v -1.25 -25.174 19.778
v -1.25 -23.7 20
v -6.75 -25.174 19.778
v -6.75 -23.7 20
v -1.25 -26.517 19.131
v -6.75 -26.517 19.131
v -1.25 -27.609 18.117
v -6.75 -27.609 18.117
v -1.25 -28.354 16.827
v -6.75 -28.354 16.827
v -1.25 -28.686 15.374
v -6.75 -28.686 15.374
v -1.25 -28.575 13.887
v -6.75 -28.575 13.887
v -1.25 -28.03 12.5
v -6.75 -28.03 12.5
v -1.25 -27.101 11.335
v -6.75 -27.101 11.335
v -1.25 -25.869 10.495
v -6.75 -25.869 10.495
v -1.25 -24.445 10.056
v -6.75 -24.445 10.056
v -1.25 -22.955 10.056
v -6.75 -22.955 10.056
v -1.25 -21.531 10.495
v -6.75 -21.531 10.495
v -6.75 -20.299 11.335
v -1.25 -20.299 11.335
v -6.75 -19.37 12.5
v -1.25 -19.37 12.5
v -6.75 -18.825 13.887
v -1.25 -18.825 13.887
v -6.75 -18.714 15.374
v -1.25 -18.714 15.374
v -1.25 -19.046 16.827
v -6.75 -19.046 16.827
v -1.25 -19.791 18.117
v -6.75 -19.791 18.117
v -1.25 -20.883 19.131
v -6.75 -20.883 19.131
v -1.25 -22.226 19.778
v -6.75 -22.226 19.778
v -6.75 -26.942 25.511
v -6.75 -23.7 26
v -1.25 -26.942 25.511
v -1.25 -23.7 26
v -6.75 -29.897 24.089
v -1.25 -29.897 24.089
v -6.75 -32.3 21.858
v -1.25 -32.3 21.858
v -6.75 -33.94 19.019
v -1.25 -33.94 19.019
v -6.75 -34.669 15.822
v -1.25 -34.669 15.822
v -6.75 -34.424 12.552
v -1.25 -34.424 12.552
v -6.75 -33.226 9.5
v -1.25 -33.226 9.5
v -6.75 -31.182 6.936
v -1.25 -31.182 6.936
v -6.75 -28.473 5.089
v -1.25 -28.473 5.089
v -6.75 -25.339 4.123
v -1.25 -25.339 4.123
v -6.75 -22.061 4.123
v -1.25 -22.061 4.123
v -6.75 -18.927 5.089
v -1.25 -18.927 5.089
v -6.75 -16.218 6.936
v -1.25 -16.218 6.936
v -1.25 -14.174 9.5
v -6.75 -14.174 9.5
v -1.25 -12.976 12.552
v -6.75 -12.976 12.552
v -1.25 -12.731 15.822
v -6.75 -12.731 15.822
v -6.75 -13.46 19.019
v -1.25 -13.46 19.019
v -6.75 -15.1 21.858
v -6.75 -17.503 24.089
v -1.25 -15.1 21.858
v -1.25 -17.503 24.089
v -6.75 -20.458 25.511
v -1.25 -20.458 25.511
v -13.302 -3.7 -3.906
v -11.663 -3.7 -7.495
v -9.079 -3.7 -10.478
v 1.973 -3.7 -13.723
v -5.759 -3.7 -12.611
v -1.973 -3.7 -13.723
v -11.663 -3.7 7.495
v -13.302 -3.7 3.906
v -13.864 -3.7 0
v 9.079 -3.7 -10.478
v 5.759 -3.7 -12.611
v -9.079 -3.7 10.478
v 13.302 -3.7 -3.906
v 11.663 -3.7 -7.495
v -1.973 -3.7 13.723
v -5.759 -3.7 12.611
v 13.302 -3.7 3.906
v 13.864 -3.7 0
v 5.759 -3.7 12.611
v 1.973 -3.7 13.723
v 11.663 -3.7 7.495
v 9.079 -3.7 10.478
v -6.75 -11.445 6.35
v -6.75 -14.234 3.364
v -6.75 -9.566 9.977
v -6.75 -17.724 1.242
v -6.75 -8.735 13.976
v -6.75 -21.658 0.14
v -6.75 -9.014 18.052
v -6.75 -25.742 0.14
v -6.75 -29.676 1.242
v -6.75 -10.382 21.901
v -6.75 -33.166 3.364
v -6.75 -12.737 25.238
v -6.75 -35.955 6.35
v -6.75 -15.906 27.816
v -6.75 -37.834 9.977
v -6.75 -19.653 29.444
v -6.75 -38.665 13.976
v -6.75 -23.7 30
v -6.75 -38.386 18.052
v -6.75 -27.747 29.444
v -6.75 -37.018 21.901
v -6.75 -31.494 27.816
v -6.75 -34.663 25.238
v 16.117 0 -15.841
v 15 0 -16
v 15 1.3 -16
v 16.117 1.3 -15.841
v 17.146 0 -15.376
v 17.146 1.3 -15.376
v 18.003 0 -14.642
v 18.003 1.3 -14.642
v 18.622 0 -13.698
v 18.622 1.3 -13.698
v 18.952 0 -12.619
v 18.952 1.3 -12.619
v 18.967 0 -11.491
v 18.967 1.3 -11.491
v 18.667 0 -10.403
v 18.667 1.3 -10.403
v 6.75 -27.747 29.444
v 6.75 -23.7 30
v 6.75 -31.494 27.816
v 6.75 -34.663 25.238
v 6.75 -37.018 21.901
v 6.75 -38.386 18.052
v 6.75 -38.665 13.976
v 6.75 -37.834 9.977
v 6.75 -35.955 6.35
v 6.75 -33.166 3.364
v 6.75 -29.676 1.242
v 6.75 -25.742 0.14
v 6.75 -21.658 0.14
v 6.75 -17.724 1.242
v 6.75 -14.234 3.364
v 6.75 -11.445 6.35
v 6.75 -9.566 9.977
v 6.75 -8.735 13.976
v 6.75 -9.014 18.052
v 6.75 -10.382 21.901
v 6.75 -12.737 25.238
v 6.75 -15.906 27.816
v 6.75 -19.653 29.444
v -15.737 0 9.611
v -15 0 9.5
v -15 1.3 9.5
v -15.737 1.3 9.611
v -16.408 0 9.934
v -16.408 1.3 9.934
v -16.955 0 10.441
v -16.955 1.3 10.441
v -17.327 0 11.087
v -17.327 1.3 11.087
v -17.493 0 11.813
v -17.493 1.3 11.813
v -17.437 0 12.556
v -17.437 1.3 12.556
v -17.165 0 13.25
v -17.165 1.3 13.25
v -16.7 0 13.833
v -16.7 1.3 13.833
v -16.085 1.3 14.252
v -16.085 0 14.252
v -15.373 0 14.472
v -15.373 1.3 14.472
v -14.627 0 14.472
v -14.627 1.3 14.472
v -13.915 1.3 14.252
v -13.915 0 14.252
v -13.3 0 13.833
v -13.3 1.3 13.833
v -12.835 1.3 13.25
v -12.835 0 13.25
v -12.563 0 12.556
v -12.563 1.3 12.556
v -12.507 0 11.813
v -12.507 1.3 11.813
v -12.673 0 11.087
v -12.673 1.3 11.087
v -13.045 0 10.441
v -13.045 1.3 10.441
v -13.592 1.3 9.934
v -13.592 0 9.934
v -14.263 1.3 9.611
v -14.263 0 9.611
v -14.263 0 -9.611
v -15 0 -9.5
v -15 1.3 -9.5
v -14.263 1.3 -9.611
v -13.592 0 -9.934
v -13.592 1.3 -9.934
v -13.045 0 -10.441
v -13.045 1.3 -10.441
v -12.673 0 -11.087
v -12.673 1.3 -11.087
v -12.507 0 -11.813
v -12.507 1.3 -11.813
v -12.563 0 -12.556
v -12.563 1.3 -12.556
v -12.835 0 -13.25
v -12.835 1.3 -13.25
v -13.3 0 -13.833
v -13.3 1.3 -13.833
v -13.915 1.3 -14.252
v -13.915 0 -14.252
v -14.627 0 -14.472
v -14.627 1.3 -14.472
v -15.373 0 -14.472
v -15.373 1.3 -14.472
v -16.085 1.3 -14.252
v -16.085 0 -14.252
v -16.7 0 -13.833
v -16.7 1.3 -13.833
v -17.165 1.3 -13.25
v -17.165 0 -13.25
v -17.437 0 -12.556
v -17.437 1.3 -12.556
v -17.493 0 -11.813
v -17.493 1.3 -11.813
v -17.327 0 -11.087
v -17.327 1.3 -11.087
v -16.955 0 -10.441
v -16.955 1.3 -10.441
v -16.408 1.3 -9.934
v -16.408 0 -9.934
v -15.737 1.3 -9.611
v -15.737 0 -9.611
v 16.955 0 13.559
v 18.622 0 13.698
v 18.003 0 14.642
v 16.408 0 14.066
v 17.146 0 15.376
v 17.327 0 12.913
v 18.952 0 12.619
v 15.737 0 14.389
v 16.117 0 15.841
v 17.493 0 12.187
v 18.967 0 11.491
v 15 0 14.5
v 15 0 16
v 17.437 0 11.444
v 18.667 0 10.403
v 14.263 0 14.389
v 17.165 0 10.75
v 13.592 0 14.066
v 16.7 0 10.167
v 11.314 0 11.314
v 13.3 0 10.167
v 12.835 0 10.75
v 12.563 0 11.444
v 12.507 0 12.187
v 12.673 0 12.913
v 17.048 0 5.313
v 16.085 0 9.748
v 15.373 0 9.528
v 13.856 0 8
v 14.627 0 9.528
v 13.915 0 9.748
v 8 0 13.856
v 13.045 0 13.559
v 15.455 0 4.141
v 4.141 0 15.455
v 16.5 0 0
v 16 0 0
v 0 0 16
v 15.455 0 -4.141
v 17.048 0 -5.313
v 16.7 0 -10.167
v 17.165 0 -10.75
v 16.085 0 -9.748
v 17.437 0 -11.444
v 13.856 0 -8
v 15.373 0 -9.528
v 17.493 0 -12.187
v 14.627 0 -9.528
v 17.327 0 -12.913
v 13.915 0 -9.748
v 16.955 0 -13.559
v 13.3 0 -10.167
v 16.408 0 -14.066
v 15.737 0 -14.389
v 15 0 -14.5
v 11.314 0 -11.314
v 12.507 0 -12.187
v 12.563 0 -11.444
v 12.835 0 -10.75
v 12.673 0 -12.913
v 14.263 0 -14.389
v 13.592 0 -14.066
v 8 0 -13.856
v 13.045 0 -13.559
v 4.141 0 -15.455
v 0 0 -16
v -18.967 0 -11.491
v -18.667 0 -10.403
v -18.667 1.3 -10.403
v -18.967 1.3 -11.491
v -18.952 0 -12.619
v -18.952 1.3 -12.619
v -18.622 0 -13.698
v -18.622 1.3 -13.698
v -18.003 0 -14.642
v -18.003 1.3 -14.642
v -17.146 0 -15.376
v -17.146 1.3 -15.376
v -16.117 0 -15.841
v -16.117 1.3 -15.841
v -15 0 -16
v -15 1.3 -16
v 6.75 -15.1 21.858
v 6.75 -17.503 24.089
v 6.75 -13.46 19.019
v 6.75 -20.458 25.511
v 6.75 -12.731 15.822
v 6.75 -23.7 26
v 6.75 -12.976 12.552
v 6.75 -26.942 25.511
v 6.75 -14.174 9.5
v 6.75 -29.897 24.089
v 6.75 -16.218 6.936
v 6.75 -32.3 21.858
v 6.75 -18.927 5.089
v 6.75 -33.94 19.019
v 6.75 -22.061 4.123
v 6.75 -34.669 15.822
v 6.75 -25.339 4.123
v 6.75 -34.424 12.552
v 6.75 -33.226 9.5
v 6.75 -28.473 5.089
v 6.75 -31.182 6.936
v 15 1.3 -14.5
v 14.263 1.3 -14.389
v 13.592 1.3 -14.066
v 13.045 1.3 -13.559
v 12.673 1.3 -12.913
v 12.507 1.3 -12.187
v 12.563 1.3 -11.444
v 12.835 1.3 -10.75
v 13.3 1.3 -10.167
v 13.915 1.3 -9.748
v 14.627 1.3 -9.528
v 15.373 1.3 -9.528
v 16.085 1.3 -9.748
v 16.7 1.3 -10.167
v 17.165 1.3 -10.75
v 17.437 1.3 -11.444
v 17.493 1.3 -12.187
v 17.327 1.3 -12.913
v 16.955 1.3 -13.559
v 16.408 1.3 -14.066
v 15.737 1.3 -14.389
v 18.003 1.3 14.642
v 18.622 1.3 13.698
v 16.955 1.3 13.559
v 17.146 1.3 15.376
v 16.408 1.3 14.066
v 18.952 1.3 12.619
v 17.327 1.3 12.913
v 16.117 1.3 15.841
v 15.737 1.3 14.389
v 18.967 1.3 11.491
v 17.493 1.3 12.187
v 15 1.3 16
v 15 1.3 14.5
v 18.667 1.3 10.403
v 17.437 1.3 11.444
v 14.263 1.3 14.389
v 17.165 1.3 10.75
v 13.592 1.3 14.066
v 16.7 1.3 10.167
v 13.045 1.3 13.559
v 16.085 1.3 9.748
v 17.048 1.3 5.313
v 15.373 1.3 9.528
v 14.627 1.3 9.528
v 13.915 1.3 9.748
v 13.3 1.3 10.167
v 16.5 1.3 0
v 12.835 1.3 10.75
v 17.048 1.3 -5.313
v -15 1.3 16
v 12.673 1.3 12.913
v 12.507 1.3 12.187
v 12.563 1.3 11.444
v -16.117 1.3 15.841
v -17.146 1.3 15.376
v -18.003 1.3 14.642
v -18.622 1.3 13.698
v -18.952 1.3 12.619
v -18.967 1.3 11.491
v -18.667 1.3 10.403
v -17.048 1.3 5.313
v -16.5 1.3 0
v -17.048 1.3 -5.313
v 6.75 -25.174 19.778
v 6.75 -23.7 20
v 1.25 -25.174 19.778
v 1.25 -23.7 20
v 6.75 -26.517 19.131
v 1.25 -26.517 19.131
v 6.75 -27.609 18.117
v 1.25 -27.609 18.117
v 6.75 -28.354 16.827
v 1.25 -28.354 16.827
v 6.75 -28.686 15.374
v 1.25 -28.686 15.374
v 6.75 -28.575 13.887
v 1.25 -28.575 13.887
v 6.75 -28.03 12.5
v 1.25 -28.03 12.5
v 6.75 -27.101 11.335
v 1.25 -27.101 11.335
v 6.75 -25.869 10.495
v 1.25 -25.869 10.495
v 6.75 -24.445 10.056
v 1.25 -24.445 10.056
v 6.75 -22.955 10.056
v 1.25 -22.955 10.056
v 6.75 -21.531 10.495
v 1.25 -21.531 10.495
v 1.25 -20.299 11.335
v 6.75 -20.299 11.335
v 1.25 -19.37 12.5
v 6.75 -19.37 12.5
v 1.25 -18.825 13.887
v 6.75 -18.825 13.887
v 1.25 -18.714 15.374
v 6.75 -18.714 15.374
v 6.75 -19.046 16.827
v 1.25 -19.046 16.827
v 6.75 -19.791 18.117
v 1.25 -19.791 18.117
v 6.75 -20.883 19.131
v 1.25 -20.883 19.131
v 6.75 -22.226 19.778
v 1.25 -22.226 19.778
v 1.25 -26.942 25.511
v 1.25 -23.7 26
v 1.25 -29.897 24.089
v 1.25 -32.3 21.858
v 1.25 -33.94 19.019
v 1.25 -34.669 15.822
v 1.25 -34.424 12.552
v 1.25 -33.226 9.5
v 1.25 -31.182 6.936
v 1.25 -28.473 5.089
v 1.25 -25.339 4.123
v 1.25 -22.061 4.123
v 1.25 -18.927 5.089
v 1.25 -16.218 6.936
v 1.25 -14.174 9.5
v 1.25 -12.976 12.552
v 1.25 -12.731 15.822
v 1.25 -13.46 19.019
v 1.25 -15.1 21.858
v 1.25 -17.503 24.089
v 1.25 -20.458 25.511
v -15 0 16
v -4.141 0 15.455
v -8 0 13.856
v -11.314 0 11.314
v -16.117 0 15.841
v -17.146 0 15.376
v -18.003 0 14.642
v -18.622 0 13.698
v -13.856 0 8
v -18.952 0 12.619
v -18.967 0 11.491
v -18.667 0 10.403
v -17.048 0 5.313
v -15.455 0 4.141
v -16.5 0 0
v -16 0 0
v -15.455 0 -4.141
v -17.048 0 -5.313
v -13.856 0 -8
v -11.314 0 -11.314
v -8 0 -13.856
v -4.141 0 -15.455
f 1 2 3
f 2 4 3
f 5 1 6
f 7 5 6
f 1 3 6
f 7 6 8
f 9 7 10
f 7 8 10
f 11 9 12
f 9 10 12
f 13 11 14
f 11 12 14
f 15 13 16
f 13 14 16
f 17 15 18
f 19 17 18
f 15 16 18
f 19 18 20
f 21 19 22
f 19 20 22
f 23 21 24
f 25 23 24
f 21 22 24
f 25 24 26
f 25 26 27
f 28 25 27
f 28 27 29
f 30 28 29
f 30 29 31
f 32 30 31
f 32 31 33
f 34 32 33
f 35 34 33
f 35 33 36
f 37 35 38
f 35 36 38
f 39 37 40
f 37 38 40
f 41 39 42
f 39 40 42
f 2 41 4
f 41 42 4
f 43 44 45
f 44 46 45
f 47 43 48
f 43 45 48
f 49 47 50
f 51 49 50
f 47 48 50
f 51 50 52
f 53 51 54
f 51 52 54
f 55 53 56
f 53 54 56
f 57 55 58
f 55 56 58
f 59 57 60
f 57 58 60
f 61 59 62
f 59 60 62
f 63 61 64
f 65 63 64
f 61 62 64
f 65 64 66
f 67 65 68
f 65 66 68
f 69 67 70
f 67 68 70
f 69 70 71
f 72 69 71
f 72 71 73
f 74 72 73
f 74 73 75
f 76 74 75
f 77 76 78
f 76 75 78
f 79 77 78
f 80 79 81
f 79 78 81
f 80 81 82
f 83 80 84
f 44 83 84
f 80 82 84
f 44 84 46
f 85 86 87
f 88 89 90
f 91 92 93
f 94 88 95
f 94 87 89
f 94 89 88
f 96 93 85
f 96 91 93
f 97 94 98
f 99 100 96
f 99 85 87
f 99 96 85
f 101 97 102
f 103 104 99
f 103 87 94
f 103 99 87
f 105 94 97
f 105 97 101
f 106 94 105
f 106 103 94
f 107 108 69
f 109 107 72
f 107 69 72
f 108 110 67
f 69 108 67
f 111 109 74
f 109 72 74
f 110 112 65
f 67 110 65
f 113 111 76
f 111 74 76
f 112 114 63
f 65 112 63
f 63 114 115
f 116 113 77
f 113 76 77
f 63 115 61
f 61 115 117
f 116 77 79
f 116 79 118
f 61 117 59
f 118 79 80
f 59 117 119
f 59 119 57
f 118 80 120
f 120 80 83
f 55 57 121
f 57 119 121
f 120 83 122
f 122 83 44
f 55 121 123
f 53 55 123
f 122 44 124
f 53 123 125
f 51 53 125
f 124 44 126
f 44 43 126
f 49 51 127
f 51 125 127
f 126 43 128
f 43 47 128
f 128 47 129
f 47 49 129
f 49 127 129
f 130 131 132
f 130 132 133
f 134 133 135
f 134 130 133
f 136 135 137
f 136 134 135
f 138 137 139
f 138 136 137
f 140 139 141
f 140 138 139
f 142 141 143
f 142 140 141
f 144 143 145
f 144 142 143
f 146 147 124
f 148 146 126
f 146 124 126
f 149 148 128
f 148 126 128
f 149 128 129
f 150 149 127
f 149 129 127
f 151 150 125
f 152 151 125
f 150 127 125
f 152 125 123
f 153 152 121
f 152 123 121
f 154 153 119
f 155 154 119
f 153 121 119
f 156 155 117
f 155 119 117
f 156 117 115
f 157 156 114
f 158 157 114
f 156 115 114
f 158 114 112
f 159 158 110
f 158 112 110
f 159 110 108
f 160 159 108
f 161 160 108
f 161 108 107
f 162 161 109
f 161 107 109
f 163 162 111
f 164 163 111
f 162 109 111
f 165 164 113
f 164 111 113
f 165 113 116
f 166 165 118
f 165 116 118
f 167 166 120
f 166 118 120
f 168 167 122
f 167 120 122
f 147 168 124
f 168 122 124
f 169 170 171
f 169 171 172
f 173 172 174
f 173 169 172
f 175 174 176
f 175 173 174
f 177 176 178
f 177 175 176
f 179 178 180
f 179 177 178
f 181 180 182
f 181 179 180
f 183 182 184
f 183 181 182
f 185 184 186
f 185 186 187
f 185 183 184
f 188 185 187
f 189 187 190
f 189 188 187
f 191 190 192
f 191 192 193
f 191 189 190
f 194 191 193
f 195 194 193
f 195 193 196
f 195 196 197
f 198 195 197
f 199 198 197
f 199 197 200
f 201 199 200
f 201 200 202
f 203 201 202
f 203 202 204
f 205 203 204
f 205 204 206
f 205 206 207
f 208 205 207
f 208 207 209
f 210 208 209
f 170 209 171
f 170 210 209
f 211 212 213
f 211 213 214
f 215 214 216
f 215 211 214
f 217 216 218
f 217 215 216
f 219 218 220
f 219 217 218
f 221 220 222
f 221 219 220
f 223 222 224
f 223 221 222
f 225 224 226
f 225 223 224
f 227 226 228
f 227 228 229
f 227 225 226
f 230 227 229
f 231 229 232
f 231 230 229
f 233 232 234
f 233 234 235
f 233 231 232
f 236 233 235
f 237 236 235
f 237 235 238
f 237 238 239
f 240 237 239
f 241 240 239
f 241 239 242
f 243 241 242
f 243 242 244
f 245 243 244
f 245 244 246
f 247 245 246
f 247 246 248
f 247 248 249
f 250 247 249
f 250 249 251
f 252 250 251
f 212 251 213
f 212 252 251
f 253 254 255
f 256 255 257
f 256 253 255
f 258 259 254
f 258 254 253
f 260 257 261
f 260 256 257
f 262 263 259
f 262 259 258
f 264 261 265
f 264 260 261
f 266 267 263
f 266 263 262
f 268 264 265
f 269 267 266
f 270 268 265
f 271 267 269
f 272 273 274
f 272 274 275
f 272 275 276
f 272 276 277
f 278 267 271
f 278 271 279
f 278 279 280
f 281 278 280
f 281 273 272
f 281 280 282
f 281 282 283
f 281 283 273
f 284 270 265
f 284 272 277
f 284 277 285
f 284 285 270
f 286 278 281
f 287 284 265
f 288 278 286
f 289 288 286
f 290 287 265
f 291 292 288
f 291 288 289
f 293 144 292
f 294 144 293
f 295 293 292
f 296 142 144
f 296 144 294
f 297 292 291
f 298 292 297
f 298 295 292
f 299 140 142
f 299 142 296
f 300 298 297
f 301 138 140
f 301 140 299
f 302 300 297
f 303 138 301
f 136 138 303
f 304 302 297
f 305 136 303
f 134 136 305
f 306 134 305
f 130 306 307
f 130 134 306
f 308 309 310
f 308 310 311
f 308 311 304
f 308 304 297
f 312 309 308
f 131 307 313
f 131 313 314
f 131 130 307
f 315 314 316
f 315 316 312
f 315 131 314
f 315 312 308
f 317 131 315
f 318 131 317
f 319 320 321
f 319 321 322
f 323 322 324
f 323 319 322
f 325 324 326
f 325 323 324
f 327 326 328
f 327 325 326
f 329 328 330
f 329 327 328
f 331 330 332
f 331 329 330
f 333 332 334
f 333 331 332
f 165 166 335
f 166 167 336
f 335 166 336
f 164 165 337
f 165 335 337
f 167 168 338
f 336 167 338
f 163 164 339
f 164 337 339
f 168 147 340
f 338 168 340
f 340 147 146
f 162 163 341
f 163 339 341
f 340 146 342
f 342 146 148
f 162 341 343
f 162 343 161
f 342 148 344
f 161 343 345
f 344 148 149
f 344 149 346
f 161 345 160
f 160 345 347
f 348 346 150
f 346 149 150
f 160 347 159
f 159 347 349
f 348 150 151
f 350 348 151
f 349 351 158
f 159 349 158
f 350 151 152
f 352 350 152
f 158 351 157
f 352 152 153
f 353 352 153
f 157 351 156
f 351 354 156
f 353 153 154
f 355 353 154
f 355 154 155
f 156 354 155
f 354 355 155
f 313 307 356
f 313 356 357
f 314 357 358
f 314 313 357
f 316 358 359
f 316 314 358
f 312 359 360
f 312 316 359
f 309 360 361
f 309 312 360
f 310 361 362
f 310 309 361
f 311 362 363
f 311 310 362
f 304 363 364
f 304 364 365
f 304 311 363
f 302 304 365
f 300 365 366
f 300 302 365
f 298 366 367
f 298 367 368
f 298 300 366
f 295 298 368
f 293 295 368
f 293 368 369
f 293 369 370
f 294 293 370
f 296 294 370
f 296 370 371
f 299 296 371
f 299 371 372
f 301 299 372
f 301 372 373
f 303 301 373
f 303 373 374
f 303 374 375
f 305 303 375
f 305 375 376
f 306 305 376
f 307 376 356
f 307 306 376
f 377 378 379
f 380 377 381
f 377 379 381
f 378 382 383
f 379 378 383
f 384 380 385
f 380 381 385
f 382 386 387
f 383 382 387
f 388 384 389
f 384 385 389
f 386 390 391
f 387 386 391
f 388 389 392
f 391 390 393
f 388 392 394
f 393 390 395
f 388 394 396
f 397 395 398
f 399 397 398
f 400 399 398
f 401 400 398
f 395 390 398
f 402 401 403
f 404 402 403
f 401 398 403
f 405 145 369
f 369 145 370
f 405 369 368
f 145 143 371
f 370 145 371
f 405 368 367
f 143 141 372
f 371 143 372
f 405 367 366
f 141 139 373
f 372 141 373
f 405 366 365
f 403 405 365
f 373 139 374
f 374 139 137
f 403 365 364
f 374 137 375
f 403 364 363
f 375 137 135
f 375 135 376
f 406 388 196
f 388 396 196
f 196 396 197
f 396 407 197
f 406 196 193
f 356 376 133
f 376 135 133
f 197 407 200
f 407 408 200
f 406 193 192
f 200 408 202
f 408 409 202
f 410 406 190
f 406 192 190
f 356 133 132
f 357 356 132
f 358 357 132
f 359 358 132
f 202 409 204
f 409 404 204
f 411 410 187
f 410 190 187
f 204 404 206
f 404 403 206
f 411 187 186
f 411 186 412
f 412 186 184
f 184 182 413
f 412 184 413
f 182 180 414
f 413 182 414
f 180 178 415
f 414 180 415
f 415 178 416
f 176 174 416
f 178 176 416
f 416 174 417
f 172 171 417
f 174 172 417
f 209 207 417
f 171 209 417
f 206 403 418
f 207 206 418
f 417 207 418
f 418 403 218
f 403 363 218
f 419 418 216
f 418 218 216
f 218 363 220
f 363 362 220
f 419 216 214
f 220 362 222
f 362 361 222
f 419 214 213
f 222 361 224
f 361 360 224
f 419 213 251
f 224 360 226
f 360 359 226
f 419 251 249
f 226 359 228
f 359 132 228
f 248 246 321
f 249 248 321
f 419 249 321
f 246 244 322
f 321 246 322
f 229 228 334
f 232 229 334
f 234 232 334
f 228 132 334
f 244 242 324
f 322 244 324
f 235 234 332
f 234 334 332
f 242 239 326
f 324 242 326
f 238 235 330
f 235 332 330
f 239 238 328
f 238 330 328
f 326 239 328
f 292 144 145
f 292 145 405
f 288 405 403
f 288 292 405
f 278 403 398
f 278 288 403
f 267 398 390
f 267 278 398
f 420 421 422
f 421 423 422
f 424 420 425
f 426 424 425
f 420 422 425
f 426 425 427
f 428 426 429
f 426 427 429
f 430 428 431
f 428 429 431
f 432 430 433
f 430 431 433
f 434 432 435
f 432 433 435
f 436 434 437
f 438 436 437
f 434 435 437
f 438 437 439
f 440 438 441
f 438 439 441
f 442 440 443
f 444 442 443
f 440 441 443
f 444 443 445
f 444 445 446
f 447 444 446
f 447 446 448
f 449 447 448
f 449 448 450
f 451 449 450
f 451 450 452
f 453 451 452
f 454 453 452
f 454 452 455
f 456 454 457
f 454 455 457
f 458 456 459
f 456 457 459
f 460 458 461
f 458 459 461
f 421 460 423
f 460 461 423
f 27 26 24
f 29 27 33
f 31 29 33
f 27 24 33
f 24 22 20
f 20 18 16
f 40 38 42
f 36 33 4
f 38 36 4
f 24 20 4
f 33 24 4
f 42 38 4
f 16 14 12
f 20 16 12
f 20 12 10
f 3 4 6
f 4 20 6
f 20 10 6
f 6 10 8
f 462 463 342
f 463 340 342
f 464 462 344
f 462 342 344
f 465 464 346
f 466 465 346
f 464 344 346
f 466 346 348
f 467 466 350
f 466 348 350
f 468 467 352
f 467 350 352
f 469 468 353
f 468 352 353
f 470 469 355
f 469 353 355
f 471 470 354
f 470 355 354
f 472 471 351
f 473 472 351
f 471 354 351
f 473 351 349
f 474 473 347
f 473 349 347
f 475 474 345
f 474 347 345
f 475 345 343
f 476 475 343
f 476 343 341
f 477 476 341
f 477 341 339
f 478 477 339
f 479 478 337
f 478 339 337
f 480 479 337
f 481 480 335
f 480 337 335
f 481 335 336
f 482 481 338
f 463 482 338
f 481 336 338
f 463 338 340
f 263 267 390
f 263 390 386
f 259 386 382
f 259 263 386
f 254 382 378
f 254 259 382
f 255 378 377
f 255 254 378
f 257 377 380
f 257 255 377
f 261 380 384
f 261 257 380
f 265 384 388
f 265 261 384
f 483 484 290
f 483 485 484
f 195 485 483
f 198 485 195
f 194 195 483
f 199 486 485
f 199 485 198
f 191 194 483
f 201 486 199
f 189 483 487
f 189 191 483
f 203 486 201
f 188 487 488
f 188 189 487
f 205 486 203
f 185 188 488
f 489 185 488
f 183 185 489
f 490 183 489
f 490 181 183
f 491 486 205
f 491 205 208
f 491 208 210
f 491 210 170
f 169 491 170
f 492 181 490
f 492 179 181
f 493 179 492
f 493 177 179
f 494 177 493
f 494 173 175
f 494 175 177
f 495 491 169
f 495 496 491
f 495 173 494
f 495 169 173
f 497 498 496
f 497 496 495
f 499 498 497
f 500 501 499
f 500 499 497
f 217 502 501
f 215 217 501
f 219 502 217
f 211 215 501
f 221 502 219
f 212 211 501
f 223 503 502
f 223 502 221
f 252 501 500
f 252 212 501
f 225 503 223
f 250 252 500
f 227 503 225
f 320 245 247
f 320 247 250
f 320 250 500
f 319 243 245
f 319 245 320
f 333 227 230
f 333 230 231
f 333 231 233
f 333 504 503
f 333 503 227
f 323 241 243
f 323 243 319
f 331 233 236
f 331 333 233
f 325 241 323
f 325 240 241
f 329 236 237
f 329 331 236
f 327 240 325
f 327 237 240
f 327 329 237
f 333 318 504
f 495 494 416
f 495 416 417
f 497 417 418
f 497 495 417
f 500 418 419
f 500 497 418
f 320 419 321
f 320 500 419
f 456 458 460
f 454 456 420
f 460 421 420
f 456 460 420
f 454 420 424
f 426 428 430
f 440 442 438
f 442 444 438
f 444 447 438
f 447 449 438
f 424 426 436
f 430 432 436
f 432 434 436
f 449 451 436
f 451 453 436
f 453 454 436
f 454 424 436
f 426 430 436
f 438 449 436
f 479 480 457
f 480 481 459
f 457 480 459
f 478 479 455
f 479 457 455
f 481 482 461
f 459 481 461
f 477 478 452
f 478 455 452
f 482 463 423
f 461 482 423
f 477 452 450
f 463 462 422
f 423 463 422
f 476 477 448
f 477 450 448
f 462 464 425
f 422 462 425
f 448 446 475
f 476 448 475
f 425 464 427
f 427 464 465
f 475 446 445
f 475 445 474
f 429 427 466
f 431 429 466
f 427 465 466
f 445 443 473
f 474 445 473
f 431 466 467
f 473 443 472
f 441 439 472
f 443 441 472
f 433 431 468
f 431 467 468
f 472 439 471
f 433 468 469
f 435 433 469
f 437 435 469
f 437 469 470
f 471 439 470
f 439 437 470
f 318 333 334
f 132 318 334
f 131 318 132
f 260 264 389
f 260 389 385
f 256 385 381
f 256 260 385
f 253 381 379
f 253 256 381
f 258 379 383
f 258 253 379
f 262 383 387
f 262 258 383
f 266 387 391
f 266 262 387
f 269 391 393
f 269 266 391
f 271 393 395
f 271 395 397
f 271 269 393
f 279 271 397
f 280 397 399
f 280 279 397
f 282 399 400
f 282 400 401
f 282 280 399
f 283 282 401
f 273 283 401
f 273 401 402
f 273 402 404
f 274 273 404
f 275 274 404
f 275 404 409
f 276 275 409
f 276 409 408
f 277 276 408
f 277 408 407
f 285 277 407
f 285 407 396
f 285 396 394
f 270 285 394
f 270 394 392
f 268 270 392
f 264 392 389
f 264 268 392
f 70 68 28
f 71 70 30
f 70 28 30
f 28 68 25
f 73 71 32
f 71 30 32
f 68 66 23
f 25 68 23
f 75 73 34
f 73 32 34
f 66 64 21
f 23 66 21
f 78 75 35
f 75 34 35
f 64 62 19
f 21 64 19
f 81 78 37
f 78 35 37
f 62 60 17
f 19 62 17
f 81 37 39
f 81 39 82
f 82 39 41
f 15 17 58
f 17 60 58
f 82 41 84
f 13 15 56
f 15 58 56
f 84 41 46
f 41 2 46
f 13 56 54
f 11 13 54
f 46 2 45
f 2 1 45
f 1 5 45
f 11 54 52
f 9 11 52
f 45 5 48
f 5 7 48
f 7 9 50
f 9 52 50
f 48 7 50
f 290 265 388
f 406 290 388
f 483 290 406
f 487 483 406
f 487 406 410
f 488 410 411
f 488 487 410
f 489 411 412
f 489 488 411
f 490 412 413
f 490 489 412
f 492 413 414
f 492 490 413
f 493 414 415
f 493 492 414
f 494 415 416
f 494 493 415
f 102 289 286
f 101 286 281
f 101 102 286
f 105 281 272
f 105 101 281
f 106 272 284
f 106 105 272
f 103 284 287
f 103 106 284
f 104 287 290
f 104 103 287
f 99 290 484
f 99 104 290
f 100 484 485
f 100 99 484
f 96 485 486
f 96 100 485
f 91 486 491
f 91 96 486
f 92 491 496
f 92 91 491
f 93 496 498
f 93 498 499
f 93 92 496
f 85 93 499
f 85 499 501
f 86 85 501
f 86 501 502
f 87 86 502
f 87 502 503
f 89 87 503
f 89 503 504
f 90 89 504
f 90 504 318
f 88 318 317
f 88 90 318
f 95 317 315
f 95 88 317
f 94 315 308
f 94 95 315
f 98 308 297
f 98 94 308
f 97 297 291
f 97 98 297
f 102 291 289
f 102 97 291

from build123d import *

# Parameters (mm, degrees)
SKETCH1_R           = 2.5
BOSS_EXTRUDE1_DEPTH = 1.3
SKETCH2_R           = 16
BOSS_EXTRUDE2_DEPTH = 3.7
BOSS_EXTRUDE2_TAPER = 30


with BuildPart() as part:
    # Sketch1 → Boss-Extrude1 (new body)
    with BuildSketch(Plane(origin=(0, 0, 0), x_dir=(1, 0, 0), z_dir=(0, 1, 0))):
        with BuildLine():
            Line((-15, 16), (15, 16))
            ThreePointArc((15, 16), (18.345844518, 14.192105029), (18.667221298, 10.40266223))
            ThreePointArc((18.667221298, 10.40266223), (16.5, 0), (18.667221298, -10.40266223))
            ThreePointArc((18.667221298, -10.40266223), (18.345844518, -14.192105029), (15, -16))
            Line((15, -16), (-15, -16))
            ThreePointArc((-15, -16), (-18.345844518, -14.192105029), (-18.667221298, -10.40266223))
            ThreePointArc((-18.667221298, -10.40266223), (-16.5, 0), (-18.667221298, 10.40266223))
            ThreePointArc((-18.667221298, 10.40266223), (-18.345844518, 14.192105029), (-15, 16))
        make_face()
        with Locations(Location((-15, 12, 0), (0, 0, 270))):
            Circle(SKETCH1_R, mode=Mode.SUBTRACT)
        with Locations(Location((15, 12, 0), (0, 0, 90))):
            Circle(SKETCH1_R, mode=Mode.SUBTRACT)
        with Locations(Location((15, -12, 0), (0, 0, 270))):
            Circle(SKETCH1_R, mode=Mode.SUBTRACT)
        with Locations(Location((-15, -12, 0), (0, 0, 90))):
            Circle(SKETCH1_R, mode=Mode.SUBTRACT)
    extrude(amount=BOSS_EXTRUDE1_DEPTH)

    # Sketch2 → Boss-Extrude2 (add)
    with BuildSketch(Plane.XZ):
        Circle(SKETCH2_R)
    extrude(amount=BOSS_EXTRUDE2_DEPTH, taper=BOSS_EXTRUDE2_TAPER)


with BuildPart() as body_2:
    # Sketch4 → Revolve1 (revolve)
    with BuildSketch(Plane(origin=(0, -23.7, 0), x_dir=(-1, 0, 0), z_dir=(0, -1, 0)), mode=Mode.PRIVATE) as revolve1_sk:
        Polygon((6.75, 0), (6.75, -4), (1.25, -4), (1.25, -10), (6.75, -10), (6.75, -15), (-6.75, -15), (-6.75, -10), (-1.25, -10), (-1.25, -4), (-6.75, -4), (-6.75, 0), align=None)
    revolve(revolve1_sk.sketch.rotate(Axis((-7.63674602, -23.7, 15), (1, 0, 0)), 180), axis=Axis((-7.63674602, -23.7, 15), (1, 0, 0)))


solid = Compound([part.part, body_2.part])
